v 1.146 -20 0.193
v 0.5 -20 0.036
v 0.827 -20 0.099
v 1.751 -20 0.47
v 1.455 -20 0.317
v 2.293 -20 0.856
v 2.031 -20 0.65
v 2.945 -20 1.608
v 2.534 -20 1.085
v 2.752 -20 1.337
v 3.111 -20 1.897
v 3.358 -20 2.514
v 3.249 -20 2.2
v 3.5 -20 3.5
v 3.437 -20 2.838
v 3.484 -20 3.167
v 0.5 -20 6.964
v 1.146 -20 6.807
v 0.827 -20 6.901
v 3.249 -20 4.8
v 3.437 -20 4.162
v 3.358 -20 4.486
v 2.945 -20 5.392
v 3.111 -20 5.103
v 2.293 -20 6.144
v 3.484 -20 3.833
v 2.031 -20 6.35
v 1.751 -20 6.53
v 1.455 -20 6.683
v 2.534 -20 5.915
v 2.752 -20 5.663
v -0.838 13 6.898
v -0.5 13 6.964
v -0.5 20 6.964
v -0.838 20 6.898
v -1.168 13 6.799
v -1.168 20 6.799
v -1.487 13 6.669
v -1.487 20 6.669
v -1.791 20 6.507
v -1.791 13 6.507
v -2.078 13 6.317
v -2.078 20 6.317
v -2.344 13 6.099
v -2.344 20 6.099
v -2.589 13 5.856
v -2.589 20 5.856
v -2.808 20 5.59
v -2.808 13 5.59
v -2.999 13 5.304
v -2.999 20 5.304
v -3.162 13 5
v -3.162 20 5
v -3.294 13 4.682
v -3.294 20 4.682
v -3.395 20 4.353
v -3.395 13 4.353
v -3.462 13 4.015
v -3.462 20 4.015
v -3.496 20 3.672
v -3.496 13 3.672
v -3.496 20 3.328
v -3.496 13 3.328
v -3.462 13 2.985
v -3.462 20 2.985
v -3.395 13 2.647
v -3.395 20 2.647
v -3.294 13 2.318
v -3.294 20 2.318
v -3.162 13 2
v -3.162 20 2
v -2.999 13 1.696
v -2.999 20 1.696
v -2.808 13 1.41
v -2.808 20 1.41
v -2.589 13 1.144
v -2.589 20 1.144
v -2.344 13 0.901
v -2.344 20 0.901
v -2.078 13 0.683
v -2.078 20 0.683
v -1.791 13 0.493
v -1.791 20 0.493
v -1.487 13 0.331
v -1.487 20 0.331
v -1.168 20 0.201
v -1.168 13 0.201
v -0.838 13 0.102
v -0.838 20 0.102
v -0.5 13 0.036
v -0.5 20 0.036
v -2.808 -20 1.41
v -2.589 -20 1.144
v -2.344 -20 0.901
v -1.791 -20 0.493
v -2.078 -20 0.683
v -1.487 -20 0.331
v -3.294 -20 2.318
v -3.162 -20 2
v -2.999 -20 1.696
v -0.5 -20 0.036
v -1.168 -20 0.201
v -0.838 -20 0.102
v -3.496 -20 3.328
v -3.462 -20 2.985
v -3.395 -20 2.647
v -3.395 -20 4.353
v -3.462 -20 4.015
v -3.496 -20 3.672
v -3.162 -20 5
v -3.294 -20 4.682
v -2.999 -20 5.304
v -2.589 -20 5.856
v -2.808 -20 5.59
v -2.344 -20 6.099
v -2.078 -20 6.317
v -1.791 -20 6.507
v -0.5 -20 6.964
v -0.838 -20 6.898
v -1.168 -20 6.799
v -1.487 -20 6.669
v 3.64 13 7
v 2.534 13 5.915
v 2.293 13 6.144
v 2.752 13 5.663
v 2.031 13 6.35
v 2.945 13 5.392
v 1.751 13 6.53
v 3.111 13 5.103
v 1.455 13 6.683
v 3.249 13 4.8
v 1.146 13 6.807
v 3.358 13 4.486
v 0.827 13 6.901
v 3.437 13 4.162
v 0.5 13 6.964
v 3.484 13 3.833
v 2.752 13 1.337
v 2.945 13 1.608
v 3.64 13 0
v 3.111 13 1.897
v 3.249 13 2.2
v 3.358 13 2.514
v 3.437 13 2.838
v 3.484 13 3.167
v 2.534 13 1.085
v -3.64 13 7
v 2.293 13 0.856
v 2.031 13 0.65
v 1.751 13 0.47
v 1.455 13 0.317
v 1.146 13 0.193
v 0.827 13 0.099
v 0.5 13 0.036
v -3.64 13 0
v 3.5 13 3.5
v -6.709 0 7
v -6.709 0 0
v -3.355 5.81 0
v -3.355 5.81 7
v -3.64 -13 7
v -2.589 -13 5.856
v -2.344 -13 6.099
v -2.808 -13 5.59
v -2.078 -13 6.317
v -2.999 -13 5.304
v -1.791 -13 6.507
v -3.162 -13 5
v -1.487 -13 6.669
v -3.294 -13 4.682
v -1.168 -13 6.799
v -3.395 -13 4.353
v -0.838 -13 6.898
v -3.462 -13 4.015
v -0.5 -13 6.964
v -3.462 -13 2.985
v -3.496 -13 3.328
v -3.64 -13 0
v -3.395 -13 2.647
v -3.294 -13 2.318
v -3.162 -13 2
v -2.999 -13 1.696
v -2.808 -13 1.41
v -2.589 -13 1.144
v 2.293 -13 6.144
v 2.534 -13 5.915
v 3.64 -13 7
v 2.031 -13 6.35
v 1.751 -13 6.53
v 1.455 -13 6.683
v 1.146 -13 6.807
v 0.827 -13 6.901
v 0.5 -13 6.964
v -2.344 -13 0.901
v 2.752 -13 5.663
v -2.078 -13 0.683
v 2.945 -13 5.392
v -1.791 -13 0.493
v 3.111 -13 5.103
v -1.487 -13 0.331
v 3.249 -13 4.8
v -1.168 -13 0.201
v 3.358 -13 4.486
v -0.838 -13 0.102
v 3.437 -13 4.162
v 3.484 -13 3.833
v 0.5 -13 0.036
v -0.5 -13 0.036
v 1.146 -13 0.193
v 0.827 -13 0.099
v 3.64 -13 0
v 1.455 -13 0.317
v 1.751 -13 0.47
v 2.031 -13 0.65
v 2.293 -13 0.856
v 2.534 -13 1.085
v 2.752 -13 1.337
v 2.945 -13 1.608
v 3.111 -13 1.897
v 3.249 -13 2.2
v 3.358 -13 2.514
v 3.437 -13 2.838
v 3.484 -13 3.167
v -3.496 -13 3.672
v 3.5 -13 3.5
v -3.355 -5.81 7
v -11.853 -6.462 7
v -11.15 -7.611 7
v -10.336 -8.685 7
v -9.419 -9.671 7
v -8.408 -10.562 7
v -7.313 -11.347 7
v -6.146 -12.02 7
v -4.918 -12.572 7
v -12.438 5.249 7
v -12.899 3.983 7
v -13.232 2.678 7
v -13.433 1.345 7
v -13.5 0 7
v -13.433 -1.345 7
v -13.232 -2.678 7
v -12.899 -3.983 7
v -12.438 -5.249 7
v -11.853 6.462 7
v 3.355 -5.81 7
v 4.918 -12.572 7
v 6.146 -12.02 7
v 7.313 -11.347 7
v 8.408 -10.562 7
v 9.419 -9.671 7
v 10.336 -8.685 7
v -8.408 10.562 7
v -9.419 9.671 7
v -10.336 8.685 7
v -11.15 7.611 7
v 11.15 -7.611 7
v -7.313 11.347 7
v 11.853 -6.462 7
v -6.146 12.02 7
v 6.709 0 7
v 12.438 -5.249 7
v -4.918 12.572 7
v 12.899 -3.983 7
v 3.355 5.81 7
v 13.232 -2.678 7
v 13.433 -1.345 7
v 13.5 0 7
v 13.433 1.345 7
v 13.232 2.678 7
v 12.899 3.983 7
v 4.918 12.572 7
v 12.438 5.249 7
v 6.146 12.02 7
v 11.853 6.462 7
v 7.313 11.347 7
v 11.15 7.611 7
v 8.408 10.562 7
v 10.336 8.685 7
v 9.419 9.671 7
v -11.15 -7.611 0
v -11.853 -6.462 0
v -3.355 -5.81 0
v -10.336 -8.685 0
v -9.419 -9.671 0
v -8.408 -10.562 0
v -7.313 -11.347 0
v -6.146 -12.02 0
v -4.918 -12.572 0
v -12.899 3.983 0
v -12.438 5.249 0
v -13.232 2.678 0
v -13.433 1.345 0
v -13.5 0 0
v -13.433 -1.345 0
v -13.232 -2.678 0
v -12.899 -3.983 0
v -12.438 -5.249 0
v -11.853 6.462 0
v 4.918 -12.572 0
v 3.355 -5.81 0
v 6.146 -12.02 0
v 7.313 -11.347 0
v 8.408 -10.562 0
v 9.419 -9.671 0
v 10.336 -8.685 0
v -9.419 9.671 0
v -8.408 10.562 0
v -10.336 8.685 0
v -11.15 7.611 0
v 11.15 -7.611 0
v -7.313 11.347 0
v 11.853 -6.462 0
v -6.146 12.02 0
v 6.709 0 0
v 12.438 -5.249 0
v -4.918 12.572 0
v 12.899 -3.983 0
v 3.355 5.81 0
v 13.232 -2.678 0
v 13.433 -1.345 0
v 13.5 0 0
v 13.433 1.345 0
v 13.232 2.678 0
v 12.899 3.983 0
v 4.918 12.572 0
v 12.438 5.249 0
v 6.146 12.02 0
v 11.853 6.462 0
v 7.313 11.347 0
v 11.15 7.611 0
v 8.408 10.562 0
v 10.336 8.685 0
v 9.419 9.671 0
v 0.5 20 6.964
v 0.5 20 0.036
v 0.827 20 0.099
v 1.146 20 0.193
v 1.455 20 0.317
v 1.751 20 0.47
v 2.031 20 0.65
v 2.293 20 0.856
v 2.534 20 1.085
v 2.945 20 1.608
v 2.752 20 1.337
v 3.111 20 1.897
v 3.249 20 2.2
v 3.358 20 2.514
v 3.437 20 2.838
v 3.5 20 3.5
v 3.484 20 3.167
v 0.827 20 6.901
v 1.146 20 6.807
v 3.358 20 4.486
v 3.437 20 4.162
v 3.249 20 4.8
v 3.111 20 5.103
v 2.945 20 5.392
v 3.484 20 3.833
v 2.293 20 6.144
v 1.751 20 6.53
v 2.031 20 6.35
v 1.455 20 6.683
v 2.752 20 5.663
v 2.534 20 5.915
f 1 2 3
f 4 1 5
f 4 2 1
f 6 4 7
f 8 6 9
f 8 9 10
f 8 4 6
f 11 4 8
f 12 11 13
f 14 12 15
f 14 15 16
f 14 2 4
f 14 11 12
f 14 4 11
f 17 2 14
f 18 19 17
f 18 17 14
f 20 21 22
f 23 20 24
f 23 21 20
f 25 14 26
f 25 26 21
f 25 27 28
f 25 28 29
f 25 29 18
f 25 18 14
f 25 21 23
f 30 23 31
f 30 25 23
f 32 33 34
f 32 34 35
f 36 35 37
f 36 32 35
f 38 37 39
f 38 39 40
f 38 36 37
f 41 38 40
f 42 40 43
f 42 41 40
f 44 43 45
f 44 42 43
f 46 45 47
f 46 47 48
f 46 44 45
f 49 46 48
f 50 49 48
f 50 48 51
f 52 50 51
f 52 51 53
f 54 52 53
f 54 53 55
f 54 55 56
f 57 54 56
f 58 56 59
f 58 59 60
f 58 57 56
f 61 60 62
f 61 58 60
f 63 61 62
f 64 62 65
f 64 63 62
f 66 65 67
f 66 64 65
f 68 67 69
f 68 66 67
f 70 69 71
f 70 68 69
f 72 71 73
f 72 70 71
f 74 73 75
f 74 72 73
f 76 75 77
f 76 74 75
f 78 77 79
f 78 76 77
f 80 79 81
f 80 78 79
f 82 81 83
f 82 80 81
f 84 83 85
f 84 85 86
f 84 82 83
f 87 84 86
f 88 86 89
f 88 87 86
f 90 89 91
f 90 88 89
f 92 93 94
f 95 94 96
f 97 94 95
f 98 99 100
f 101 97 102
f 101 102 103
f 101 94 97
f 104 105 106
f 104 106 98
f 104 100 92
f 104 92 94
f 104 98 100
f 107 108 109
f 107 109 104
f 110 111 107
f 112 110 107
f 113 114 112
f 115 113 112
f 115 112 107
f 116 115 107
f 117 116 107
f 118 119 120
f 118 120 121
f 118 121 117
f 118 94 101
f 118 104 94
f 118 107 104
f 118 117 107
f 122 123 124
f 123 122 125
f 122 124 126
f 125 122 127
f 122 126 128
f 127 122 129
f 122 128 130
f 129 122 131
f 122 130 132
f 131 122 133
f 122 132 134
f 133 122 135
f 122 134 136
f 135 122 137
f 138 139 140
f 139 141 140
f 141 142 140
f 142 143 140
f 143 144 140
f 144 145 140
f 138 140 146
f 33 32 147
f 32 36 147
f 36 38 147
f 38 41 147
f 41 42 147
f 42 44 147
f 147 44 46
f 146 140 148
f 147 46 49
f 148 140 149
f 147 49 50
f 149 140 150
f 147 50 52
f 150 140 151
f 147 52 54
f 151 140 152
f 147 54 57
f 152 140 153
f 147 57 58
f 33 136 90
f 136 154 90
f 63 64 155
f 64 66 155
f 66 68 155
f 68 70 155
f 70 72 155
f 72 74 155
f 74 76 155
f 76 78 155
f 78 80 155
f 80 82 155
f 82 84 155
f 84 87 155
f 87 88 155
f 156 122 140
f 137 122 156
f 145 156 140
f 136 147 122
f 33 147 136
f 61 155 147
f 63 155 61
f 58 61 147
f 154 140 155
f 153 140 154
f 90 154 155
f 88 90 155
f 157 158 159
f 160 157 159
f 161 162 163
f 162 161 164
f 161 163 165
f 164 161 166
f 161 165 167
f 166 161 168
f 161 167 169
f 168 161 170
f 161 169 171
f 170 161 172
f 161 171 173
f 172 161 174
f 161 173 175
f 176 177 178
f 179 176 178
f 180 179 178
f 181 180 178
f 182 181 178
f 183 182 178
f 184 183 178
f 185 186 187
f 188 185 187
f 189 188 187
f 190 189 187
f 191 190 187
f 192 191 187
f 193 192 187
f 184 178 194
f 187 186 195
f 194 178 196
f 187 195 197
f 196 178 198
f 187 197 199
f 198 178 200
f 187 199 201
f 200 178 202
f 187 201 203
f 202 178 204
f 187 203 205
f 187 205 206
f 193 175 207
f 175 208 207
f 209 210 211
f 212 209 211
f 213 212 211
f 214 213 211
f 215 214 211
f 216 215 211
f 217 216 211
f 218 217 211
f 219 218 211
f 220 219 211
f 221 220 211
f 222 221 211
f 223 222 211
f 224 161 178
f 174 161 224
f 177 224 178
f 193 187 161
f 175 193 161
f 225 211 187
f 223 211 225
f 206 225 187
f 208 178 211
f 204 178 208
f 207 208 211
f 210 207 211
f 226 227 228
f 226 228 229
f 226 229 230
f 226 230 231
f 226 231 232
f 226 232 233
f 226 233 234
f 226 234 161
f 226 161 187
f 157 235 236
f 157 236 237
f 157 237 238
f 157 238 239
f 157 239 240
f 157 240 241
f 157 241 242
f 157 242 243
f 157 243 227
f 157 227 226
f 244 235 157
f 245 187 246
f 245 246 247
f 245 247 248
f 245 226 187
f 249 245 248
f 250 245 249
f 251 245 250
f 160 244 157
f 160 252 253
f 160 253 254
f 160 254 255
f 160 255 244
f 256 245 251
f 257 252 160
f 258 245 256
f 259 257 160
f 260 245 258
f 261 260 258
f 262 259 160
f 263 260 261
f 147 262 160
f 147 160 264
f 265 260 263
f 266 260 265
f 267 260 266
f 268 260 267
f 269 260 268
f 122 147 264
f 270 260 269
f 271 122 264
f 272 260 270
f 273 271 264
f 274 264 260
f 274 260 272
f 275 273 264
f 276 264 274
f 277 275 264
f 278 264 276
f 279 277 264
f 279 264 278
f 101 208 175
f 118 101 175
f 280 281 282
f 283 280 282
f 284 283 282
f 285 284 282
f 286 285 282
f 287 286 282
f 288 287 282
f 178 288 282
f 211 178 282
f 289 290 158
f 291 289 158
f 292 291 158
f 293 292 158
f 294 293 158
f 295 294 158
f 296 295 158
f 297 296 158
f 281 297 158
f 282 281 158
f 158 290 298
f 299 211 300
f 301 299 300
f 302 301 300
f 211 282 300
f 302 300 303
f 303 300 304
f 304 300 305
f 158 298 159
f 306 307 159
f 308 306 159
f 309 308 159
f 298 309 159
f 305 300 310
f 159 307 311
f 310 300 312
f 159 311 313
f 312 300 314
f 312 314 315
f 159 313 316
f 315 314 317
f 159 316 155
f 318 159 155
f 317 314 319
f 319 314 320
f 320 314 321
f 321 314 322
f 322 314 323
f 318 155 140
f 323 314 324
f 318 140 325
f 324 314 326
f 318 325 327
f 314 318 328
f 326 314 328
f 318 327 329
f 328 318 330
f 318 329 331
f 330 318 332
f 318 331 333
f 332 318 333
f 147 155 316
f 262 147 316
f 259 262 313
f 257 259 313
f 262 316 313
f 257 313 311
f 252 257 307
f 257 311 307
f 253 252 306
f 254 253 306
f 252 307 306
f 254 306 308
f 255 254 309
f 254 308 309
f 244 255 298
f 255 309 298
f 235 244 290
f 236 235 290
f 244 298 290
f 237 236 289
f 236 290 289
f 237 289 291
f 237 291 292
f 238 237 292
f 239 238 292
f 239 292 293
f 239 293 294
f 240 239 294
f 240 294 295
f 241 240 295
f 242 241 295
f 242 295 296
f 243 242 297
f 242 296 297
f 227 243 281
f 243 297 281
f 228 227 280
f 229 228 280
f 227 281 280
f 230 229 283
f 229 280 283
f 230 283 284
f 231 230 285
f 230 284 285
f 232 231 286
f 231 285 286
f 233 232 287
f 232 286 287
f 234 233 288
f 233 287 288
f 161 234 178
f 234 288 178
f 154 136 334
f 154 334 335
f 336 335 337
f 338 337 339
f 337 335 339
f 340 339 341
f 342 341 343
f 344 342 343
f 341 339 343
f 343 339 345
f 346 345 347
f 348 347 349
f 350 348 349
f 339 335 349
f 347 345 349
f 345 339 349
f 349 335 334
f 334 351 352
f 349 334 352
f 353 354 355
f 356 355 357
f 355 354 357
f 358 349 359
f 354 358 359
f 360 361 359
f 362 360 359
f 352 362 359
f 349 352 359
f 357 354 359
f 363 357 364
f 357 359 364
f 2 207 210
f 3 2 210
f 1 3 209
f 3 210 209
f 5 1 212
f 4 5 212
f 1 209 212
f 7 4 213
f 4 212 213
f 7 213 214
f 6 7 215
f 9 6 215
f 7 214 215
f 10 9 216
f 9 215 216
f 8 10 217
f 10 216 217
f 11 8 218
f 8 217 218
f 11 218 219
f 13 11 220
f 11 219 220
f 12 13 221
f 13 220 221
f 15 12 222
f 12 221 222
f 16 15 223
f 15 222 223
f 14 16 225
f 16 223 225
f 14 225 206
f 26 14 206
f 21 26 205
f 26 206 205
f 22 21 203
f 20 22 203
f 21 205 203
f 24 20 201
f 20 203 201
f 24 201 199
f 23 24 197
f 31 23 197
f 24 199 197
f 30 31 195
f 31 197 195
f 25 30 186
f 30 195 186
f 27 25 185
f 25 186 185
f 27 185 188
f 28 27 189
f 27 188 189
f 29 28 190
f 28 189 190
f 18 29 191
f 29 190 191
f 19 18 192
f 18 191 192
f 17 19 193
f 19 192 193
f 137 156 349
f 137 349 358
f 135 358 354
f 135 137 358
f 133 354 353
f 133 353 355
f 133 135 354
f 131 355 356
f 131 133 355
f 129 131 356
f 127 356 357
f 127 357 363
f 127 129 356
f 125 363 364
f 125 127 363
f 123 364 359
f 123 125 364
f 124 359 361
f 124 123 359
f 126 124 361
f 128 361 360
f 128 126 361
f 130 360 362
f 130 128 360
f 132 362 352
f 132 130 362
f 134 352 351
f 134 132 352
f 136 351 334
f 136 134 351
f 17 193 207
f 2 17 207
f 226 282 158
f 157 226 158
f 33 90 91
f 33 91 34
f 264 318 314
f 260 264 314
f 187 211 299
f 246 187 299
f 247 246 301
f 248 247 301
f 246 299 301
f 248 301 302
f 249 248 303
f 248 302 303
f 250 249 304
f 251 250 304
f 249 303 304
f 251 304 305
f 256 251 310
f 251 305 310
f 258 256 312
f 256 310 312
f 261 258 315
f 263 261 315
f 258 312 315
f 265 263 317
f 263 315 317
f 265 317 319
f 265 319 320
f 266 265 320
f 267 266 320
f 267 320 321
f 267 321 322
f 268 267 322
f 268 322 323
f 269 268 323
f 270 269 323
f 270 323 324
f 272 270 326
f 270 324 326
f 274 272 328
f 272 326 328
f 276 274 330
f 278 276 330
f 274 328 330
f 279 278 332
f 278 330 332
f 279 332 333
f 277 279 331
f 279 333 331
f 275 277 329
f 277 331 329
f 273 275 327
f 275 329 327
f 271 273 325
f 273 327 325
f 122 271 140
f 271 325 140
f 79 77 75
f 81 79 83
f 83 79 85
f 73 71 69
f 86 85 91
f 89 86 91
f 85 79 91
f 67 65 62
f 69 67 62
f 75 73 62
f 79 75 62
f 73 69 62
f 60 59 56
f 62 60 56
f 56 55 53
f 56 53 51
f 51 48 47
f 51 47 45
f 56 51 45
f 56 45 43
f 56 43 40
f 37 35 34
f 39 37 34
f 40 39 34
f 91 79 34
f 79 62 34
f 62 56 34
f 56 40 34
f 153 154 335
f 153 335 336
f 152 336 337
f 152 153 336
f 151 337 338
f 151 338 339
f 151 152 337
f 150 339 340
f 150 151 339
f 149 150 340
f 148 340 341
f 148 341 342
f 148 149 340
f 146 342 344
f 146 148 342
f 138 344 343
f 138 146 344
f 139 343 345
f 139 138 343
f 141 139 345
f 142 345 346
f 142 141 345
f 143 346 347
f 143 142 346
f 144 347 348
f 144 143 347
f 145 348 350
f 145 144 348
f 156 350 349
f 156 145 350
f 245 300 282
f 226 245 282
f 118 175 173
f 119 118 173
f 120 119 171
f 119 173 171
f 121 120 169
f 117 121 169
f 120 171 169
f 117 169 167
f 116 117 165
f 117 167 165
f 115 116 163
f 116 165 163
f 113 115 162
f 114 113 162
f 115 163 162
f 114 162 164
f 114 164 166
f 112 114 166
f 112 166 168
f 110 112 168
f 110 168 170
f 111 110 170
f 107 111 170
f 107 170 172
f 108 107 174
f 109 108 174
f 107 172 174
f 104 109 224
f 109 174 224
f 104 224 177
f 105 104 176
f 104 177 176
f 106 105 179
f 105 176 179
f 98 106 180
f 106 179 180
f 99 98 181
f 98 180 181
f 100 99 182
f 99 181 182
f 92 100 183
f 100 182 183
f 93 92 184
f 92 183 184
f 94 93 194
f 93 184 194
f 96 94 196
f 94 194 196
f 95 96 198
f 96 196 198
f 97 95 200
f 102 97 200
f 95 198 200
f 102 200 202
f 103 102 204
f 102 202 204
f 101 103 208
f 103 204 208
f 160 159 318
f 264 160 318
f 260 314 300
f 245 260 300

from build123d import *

# Parameters (mm, degrees)
F1_DEPTH = 7
F3_DEPTH = 7


# Not quite as in the source:
# - a pattern or mirror of a feature is missing from the dataset's text; its kind, count and spacing are read off the source's solid


with BuildPart() as f1:
    # F0 (on Top) → F1 (new body)
    with BuildSketch(Plane.XY):
        with BuildLine():
            Line((3.6400549446, 13), (-3.6400549446, 13))
            ThreePointArc((-3.6400549446, 13), (-13.5, 0), (-3.6400549446, -13))
            Line((-3.6400549446, -13), (3.6400549446, -13))
            ThreePointArc((3.6400549446, -13), (13.5, 0), (3.6400549446, 13))
        make_face()
        Polygon((-6.7091866291, 0), (-3.3545933146, 5.8103260596), (3.3545933146, 5.8103260596), (6.7091866291, 0), (3.3545933146, -5.8103260596), (-3.3545933146, -5.8103260596), align=None, mode=Mode.SUBTRACT)
    extrude(amount=F1_DEPTH)

    # F2 (on face) → F3 (join)
    with BuildSketch(Plane.XZ.offset(13)):
        with BuildLine():
            Line((-0.5, 0.0358983849), (-0.5, 6.9641016151))
            ThreePointArc((-0.5, 6.9641016151), (-3.5, 3.5), (-0.5, 0.0358983849))
        make_face()
        with BuildLine():
            ThreePointArc((0.5, 0.0358983849), (2.6457513111, 1.2087121525), (3.5, 3.5))
            ThreePointArc((3.5, 3.5), (2.6457513111, 5.7912878475), (0.5, 6.9641016151))
            Line((0.5, 6.9641016151), (0.5, 0.0358983849))
        make_face()
    f3 = extrude(amount=F3_DEPTH)

    # F3_copies: F3 across plane
    add(f3.mirror(Plane.ZX))


solid = f1.part
